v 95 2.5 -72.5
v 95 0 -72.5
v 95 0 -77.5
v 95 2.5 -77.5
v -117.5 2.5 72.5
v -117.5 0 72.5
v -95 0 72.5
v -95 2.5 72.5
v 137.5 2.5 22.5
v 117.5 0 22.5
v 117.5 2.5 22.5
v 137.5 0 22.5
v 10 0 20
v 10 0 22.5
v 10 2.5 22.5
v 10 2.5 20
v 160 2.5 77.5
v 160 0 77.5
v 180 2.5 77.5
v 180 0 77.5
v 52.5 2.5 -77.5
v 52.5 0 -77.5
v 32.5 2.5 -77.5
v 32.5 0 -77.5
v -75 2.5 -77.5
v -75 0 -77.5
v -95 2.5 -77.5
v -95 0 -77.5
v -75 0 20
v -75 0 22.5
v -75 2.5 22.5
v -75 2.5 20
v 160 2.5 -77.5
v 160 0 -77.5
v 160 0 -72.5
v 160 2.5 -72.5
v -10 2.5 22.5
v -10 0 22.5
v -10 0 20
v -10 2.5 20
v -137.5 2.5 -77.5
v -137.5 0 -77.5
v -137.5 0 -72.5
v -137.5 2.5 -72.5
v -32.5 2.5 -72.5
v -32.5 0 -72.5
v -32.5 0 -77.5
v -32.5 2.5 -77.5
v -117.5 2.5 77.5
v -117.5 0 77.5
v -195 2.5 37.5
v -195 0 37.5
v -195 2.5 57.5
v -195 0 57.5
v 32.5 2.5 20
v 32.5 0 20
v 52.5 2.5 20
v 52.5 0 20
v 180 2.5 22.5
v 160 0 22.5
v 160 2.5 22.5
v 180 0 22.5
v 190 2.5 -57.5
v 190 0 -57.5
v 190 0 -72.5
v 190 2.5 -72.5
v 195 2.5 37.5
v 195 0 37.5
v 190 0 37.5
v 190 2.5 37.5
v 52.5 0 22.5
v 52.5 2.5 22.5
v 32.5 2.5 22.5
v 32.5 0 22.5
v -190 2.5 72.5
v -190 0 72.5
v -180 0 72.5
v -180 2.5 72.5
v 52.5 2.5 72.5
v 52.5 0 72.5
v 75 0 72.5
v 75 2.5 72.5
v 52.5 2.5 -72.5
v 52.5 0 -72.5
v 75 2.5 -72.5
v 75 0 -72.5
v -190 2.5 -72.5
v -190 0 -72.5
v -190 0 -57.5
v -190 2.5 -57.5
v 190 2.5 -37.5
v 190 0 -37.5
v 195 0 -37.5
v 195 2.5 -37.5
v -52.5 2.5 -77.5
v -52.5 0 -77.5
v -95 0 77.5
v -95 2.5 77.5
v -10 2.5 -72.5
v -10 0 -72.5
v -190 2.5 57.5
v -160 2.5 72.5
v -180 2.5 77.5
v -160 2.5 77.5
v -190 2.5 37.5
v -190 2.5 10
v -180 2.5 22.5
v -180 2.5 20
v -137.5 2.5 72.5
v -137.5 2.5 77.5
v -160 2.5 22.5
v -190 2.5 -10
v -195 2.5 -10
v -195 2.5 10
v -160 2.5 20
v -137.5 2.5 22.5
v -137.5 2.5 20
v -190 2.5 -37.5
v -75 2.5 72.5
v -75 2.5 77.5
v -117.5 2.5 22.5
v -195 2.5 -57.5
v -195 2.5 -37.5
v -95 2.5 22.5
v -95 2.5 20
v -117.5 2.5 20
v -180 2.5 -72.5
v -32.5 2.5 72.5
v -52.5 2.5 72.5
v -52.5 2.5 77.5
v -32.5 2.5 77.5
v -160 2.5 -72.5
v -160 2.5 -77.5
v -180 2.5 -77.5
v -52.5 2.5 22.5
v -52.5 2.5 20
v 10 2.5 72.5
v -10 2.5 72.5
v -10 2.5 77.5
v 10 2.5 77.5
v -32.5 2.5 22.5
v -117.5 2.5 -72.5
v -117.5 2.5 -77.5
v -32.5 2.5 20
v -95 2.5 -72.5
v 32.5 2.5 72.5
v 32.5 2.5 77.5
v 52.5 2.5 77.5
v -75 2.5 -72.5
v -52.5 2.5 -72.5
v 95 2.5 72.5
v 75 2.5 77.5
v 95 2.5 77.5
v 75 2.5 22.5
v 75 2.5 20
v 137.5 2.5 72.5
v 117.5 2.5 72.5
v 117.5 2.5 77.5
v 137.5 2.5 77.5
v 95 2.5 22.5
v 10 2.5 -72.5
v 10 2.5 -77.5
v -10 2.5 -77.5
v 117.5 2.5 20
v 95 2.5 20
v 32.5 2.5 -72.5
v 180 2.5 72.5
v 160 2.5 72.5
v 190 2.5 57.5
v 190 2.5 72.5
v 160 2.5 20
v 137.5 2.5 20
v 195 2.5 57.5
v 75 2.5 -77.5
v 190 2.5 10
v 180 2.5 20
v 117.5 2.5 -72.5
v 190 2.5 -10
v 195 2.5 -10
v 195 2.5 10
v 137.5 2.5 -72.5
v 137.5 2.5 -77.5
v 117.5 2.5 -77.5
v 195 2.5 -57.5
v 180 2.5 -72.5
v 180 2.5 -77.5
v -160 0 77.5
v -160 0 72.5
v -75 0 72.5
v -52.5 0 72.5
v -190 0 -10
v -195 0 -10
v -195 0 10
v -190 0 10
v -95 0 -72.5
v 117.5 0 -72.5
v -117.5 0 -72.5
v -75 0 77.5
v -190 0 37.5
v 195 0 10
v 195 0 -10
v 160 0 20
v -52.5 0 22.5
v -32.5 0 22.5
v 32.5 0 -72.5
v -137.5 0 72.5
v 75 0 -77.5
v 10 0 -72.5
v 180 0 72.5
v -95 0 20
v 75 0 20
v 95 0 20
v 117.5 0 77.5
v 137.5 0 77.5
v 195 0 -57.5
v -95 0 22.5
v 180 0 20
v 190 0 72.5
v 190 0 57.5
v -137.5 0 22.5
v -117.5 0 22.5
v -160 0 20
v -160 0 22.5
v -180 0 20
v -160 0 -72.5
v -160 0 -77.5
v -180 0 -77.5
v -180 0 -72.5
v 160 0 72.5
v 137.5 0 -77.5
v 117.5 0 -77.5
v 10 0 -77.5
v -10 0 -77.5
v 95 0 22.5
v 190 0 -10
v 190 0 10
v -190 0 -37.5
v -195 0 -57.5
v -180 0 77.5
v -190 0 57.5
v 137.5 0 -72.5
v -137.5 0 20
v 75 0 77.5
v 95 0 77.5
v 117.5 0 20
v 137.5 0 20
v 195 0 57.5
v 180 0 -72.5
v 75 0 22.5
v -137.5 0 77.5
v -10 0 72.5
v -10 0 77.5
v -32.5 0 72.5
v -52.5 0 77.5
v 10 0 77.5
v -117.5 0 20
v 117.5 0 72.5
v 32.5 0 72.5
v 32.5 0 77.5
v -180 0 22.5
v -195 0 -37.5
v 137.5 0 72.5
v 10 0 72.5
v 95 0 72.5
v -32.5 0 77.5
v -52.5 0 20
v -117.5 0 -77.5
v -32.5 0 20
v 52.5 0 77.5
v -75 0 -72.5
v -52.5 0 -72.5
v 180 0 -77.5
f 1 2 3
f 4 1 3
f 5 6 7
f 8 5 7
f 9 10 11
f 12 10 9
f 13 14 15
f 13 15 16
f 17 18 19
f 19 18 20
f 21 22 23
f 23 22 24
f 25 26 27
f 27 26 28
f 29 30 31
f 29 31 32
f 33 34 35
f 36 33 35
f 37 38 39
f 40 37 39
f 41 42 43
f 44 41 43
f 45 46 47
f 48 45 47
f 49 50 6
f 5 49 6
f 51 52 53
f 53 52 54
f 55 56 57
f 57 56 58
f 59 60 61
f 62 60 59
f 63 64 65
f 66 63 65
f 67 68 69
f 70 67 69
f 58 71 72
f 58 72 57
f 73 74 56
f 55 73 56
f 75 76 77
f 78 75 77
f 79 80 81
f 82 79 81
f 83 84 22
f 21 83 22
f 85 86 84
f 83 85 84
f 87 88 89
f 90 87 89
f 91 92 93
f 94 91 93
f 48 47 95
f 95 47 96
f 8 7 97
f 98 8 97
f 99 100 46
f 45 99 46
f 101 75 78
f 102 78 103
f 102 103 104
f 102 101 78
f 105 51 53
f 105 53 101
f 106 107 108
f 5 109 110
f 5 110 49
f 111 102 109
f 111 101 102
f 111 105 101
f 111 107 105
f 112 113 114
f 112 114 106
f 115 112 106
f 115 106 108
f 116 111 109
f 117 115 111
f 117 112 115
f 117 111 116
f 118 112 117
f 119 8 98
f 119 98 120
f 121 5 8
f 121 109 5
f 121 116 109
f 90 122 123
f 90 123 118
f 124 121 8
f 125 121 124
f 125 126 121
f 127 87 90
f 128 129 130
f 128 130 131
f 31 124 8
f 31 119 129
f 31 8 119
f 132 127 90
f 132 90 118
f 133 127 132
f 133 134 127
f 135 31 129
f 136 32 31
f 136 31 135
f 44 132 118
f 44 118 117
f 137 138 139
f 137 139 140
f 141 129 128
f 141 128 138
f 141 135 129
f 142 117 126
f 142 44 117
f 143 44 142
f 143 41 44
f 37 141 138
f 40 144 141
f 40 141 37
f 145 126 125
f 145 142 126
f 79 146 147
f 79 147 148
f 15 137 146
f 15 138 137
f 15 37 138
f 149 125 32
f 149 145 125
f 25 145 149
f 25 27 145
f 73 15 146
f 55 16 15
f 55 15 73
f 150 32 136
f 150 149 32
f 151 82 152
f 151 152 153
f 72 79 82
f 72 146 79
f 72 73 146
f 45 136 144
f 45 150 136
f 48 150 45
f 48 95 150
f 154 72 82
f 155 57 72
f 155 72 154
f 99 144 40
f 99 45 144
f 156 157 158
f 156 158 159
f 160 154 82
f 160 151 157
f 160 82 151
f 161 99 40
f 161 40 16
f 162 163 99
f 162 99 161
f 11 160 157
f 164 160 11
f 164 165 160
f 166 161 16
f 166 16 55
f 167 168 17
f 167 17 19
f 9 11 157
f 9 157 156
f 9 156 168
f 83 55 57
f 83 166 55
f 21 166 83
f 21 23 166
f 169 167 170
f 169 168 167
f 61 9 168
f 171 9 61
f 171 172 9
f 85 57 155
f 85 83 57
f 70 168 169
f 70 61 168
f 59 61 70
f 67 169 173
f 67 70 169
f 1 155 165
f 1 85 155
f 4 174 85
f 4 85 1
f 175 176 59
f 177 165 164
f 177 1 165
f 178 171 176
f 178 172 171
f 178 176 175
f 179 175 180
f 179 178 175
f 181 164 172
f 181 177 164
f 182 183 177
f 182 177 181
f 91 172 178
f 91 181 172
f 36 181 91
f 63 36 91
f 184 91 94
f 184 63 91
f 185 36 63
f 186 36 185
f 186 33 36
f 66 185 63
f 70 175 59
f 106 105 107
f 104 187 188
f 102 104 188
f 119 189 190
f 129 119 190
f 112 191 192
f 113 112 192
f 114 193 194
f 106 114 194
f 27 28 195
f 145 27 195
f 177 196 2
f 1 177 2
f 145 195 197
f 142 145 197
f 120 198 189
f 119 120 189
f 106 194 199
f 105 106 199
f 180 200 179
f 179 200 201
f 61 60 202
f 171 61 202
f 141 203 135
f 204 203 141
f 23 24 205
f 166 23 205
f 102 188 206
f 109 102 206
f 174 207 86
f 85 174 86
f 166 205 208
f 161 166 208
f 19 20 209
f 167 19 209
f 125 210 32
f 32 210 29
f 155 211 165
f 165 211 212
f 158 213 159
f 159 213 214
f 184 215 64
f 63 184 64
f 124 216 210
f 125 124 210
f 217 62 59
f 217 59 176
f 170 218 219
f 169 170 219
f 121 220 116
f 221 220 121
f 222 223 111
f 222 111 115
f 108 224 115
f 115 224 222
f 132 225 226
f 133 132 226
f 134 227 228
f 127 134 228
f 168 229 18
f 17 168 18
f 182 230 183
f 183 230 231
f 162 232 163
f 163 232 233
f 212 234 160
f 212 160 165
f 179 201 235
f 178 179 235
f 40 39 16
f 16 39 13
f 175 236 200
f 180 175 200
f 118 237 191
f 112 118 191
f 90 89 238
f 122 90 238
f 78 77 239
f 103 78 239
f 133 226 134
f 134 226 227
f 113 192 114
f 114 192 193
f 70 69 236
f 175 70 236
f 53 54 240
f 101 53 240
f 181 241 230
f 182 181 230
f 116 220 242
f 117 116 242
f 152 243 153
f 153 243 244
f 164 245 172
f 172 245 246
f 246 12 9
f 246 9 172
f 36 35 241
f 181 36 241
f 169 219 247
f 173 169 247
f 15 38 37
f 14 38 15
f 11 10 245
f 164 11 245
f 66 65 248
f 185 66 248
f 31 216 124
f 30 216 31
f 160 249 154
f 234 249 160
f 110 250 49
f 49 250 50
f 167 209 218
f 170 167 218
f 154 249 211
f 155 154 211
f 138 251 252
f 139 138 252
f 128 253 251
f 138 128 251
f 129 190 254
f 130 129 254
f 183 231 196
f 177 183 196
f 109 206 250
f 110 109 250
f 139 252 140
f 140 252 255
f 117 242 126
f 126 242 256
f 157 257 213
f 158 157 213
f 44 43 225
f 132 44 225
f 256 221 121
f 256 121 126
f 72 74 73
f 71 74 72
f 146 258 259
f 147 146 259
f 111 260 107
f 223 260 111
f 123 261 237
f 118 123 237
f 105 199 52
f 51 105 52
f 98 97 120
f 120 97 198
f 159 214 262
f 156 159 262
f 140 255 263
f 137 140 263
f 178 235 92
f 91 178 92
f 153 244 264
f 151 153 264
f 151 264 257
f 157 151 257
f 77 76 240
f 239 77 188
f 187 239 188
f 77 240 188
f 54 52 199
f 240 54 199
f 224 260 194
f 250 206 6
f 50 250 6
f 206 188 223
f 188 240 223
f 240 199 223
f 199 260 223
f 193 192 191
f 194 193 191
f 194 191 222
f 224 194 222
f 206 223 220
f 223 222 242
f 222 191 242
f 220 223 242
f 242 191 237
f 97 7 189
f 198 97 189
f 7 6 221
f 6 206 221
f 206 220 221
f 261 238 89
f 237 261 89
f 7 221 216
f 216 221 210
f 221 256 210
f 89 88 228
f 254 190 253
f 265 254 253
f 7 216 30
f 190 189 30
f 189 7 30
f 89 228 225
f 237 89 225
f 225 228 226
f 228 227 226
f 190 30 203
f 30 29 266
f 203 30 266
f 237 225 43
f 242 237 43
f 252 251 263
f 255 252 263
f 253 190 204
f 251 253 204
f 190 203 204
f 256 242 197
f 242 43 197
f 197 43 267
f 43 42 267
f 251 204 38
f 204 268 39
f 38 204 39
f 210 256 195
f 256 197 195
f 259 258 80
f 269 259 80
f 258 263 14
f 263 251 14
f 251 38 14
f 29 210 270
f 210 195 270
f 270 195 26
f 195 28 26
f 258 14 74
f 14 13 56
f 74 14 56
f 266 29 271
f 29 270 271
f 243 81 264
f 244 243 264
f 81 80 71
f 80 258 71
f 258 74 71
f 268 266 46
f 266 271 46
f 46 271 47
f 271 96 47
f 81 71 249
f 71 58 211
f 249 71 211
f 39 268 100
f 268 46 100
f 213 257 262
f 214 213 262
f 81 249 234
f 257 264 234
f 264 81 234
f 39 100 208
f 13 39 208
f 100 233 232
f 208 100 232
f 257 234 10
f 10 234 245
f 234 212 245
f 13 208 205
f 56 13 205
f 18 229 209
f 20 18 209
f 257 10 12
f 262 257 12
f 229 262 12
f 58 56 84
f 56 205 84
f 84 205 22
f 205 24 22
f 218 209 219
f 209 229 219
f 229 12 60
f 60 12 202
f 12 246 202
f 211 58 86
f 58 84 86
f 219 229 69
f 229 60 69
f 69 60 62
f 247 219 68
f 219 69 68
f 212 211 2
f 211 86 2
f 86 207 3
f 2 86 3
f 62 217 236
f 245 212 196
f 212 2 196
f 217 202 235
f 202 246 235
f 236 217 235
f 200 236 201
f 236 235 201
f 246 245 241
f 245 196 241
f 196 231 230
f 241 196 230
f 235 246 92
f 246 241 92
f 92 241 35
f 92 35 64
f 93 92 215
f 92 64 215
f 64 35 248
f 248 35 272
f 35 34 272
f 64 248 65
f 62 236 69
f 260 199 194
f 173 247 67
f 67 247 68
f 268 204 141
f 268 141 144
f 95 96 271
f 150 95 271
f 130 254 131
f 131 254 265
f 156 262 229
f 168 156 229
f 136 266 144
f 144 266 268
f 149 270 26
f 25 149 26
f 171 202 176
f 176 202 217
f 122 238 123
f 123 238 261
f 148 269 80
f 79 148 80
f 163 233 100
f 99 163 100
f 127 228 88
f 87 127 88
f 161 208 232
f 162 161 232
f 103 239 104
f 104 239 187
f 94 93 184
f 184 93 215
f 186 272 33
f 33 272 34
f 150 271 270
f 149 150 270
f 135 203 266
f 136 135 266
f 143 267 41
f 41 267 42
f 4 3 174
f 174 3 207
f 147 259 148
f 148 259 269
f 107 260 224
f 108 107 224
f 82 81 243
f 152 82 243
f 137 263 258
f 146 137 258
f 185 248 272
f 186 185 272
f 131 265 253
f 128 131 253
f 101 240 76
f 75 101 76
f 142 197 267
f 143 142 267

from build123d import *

# Parameters (mm, degrees)
SKETCH1_2_W         = 20
SKETCH1_2_H         = 2.5
BOSS_EXTRUDE2_DEPTH = 2.5


with BuildPart() as part:
    # Sketch1<2> → Boss-Extrude2 (new body)
    with BuildSketch(Plane(origin=(0, 0, 0), x_dir=(1, 0, 0), z_dir=(0, 1, 0))):
        Polygon((-190, -72.5), (-180, -72.5), (-180, -77.5), (-160, -77.5), (-160, -72.5), (-137.5, -72.5), (-137.5, -77.5), (-117.5, -77.5), (-117.5, -72.5), (-95, -72.5), (-95, -77.5), (-75, -77.5), (-75, -72.5), (-52.5, -72.5), (-52.5, -77.5), (-32.5, -77.5), (-32.5, -72.5), (-10, -72.5), (-10, -77.5), (10, -77.5), (10, -72.5), (32.5, -72.5), (32.5, -77.5), (52.5, -77.5), (52.5, -72.5), (75, -72.5), (75, -77.5), (95, -77.5), (95, -72.5), (117.5, -72.5), (117.5, -77.5), (137.5, -77.5), (137.5, -72.5), (160, -72.5), (160, -77.5), (180, -77.5), (180, -72.5), (190, -72.5), (190, -57.5), (195, -57.5), (195, -37.5), (190, -37.5), (190, -10), (195, -10), (195, 10), (190, 10), (190, 37.5), (195, 37.5), (195, 57.5), (190, 57.5), (190, 72.5), (180, 72.5), (180, 77.5), (160, 77.5), (160, 72.5), (137.5, 72.5), (137.5, 77.5), (117.5, 77.5), (117.5, 72.5), (95, 72.5), (95, 77.5), (75, 77.5), (75, 72.5), (52.5, 72.5), (52.5, 77.5), (32.5, 77.5), (32.5, 72.5), (10, 72.5), (10, 77.5), (-10, 77.5), (-10, 72.5), (-32.5, 72.5), (-32.5, 77.5), (-52.5, 77.5), (-52.5, 72.5), (-75, 72.5), (-75, 77.5), (-95, 77.5), (-95, 72.5), (-117.5, 72.5), (-117.5, 77.5), (-137.5, 77.5), (-137.5, 72.5), (-160, 72.5), (-160, 77.5), (-180, 77.5), (-180, 72.5), (-190, 72.5), (-190, 57.5), (-195, 57.5), (-195, 37.5), (-190, 37.5), (-190, 10), (-195, 10), (-195, -10), (-190, -10), (-190, -37.5), (-195, -37.5), (-195, -57.5), (-190, -57.5), align=None)
        with Locations((-170, -21.25)):
            Rectangle(SKETCH1_2_W, SKETCH1_2_H, mode=Mode.SUBTRACT)
        with Locations((-127.5, -21.25)):
            Rectangle(SKETCH1_2_W, SKETCH1_2_H, mode=Mode.SUBTRACT)
        with Locations((-85, -21.25)):
            Rectangle(SKETCH1_2_W, SKETCH1_2_H, mode=Mode.SUBTRACT)
        with Locations((-42.5, -21.25)):
            Rectangle(SKETCH1_2_W, SKETCH1_2_H, mode=Mode.SUBTRACT)
        with Locations((0, -21.25)):
            Rectangle(SKETCH1_2_W, SKETCH1_2_H, mode=Mode.SUBTRACT)
        with Locations((42.5, -21.25)):
            Rectangle(SKETCH1_2_W, SKETCH1_2_H, mode=Mode.SUBTRACT)
        with Locations((85, -21.25)):
            Rectangle(SKETCH1_2_W, SKETCH1_2_H, mode=Mode.SUBTRACT)
        with Locations((127.5, -21.25)):
            Rectangle(SKETCH1_2_W, SKETCH1_2_H, mode=Mode.SUBTRACT)
        with Locations((170, -21.25)):
            Rectangle(SKETCH1_2_W, SKETCH1_2_H, mode=Mode.SUBTRACT)
    extrude(amount=BOSS_EXTRUDE2_DEPTH)


solid = part.part
